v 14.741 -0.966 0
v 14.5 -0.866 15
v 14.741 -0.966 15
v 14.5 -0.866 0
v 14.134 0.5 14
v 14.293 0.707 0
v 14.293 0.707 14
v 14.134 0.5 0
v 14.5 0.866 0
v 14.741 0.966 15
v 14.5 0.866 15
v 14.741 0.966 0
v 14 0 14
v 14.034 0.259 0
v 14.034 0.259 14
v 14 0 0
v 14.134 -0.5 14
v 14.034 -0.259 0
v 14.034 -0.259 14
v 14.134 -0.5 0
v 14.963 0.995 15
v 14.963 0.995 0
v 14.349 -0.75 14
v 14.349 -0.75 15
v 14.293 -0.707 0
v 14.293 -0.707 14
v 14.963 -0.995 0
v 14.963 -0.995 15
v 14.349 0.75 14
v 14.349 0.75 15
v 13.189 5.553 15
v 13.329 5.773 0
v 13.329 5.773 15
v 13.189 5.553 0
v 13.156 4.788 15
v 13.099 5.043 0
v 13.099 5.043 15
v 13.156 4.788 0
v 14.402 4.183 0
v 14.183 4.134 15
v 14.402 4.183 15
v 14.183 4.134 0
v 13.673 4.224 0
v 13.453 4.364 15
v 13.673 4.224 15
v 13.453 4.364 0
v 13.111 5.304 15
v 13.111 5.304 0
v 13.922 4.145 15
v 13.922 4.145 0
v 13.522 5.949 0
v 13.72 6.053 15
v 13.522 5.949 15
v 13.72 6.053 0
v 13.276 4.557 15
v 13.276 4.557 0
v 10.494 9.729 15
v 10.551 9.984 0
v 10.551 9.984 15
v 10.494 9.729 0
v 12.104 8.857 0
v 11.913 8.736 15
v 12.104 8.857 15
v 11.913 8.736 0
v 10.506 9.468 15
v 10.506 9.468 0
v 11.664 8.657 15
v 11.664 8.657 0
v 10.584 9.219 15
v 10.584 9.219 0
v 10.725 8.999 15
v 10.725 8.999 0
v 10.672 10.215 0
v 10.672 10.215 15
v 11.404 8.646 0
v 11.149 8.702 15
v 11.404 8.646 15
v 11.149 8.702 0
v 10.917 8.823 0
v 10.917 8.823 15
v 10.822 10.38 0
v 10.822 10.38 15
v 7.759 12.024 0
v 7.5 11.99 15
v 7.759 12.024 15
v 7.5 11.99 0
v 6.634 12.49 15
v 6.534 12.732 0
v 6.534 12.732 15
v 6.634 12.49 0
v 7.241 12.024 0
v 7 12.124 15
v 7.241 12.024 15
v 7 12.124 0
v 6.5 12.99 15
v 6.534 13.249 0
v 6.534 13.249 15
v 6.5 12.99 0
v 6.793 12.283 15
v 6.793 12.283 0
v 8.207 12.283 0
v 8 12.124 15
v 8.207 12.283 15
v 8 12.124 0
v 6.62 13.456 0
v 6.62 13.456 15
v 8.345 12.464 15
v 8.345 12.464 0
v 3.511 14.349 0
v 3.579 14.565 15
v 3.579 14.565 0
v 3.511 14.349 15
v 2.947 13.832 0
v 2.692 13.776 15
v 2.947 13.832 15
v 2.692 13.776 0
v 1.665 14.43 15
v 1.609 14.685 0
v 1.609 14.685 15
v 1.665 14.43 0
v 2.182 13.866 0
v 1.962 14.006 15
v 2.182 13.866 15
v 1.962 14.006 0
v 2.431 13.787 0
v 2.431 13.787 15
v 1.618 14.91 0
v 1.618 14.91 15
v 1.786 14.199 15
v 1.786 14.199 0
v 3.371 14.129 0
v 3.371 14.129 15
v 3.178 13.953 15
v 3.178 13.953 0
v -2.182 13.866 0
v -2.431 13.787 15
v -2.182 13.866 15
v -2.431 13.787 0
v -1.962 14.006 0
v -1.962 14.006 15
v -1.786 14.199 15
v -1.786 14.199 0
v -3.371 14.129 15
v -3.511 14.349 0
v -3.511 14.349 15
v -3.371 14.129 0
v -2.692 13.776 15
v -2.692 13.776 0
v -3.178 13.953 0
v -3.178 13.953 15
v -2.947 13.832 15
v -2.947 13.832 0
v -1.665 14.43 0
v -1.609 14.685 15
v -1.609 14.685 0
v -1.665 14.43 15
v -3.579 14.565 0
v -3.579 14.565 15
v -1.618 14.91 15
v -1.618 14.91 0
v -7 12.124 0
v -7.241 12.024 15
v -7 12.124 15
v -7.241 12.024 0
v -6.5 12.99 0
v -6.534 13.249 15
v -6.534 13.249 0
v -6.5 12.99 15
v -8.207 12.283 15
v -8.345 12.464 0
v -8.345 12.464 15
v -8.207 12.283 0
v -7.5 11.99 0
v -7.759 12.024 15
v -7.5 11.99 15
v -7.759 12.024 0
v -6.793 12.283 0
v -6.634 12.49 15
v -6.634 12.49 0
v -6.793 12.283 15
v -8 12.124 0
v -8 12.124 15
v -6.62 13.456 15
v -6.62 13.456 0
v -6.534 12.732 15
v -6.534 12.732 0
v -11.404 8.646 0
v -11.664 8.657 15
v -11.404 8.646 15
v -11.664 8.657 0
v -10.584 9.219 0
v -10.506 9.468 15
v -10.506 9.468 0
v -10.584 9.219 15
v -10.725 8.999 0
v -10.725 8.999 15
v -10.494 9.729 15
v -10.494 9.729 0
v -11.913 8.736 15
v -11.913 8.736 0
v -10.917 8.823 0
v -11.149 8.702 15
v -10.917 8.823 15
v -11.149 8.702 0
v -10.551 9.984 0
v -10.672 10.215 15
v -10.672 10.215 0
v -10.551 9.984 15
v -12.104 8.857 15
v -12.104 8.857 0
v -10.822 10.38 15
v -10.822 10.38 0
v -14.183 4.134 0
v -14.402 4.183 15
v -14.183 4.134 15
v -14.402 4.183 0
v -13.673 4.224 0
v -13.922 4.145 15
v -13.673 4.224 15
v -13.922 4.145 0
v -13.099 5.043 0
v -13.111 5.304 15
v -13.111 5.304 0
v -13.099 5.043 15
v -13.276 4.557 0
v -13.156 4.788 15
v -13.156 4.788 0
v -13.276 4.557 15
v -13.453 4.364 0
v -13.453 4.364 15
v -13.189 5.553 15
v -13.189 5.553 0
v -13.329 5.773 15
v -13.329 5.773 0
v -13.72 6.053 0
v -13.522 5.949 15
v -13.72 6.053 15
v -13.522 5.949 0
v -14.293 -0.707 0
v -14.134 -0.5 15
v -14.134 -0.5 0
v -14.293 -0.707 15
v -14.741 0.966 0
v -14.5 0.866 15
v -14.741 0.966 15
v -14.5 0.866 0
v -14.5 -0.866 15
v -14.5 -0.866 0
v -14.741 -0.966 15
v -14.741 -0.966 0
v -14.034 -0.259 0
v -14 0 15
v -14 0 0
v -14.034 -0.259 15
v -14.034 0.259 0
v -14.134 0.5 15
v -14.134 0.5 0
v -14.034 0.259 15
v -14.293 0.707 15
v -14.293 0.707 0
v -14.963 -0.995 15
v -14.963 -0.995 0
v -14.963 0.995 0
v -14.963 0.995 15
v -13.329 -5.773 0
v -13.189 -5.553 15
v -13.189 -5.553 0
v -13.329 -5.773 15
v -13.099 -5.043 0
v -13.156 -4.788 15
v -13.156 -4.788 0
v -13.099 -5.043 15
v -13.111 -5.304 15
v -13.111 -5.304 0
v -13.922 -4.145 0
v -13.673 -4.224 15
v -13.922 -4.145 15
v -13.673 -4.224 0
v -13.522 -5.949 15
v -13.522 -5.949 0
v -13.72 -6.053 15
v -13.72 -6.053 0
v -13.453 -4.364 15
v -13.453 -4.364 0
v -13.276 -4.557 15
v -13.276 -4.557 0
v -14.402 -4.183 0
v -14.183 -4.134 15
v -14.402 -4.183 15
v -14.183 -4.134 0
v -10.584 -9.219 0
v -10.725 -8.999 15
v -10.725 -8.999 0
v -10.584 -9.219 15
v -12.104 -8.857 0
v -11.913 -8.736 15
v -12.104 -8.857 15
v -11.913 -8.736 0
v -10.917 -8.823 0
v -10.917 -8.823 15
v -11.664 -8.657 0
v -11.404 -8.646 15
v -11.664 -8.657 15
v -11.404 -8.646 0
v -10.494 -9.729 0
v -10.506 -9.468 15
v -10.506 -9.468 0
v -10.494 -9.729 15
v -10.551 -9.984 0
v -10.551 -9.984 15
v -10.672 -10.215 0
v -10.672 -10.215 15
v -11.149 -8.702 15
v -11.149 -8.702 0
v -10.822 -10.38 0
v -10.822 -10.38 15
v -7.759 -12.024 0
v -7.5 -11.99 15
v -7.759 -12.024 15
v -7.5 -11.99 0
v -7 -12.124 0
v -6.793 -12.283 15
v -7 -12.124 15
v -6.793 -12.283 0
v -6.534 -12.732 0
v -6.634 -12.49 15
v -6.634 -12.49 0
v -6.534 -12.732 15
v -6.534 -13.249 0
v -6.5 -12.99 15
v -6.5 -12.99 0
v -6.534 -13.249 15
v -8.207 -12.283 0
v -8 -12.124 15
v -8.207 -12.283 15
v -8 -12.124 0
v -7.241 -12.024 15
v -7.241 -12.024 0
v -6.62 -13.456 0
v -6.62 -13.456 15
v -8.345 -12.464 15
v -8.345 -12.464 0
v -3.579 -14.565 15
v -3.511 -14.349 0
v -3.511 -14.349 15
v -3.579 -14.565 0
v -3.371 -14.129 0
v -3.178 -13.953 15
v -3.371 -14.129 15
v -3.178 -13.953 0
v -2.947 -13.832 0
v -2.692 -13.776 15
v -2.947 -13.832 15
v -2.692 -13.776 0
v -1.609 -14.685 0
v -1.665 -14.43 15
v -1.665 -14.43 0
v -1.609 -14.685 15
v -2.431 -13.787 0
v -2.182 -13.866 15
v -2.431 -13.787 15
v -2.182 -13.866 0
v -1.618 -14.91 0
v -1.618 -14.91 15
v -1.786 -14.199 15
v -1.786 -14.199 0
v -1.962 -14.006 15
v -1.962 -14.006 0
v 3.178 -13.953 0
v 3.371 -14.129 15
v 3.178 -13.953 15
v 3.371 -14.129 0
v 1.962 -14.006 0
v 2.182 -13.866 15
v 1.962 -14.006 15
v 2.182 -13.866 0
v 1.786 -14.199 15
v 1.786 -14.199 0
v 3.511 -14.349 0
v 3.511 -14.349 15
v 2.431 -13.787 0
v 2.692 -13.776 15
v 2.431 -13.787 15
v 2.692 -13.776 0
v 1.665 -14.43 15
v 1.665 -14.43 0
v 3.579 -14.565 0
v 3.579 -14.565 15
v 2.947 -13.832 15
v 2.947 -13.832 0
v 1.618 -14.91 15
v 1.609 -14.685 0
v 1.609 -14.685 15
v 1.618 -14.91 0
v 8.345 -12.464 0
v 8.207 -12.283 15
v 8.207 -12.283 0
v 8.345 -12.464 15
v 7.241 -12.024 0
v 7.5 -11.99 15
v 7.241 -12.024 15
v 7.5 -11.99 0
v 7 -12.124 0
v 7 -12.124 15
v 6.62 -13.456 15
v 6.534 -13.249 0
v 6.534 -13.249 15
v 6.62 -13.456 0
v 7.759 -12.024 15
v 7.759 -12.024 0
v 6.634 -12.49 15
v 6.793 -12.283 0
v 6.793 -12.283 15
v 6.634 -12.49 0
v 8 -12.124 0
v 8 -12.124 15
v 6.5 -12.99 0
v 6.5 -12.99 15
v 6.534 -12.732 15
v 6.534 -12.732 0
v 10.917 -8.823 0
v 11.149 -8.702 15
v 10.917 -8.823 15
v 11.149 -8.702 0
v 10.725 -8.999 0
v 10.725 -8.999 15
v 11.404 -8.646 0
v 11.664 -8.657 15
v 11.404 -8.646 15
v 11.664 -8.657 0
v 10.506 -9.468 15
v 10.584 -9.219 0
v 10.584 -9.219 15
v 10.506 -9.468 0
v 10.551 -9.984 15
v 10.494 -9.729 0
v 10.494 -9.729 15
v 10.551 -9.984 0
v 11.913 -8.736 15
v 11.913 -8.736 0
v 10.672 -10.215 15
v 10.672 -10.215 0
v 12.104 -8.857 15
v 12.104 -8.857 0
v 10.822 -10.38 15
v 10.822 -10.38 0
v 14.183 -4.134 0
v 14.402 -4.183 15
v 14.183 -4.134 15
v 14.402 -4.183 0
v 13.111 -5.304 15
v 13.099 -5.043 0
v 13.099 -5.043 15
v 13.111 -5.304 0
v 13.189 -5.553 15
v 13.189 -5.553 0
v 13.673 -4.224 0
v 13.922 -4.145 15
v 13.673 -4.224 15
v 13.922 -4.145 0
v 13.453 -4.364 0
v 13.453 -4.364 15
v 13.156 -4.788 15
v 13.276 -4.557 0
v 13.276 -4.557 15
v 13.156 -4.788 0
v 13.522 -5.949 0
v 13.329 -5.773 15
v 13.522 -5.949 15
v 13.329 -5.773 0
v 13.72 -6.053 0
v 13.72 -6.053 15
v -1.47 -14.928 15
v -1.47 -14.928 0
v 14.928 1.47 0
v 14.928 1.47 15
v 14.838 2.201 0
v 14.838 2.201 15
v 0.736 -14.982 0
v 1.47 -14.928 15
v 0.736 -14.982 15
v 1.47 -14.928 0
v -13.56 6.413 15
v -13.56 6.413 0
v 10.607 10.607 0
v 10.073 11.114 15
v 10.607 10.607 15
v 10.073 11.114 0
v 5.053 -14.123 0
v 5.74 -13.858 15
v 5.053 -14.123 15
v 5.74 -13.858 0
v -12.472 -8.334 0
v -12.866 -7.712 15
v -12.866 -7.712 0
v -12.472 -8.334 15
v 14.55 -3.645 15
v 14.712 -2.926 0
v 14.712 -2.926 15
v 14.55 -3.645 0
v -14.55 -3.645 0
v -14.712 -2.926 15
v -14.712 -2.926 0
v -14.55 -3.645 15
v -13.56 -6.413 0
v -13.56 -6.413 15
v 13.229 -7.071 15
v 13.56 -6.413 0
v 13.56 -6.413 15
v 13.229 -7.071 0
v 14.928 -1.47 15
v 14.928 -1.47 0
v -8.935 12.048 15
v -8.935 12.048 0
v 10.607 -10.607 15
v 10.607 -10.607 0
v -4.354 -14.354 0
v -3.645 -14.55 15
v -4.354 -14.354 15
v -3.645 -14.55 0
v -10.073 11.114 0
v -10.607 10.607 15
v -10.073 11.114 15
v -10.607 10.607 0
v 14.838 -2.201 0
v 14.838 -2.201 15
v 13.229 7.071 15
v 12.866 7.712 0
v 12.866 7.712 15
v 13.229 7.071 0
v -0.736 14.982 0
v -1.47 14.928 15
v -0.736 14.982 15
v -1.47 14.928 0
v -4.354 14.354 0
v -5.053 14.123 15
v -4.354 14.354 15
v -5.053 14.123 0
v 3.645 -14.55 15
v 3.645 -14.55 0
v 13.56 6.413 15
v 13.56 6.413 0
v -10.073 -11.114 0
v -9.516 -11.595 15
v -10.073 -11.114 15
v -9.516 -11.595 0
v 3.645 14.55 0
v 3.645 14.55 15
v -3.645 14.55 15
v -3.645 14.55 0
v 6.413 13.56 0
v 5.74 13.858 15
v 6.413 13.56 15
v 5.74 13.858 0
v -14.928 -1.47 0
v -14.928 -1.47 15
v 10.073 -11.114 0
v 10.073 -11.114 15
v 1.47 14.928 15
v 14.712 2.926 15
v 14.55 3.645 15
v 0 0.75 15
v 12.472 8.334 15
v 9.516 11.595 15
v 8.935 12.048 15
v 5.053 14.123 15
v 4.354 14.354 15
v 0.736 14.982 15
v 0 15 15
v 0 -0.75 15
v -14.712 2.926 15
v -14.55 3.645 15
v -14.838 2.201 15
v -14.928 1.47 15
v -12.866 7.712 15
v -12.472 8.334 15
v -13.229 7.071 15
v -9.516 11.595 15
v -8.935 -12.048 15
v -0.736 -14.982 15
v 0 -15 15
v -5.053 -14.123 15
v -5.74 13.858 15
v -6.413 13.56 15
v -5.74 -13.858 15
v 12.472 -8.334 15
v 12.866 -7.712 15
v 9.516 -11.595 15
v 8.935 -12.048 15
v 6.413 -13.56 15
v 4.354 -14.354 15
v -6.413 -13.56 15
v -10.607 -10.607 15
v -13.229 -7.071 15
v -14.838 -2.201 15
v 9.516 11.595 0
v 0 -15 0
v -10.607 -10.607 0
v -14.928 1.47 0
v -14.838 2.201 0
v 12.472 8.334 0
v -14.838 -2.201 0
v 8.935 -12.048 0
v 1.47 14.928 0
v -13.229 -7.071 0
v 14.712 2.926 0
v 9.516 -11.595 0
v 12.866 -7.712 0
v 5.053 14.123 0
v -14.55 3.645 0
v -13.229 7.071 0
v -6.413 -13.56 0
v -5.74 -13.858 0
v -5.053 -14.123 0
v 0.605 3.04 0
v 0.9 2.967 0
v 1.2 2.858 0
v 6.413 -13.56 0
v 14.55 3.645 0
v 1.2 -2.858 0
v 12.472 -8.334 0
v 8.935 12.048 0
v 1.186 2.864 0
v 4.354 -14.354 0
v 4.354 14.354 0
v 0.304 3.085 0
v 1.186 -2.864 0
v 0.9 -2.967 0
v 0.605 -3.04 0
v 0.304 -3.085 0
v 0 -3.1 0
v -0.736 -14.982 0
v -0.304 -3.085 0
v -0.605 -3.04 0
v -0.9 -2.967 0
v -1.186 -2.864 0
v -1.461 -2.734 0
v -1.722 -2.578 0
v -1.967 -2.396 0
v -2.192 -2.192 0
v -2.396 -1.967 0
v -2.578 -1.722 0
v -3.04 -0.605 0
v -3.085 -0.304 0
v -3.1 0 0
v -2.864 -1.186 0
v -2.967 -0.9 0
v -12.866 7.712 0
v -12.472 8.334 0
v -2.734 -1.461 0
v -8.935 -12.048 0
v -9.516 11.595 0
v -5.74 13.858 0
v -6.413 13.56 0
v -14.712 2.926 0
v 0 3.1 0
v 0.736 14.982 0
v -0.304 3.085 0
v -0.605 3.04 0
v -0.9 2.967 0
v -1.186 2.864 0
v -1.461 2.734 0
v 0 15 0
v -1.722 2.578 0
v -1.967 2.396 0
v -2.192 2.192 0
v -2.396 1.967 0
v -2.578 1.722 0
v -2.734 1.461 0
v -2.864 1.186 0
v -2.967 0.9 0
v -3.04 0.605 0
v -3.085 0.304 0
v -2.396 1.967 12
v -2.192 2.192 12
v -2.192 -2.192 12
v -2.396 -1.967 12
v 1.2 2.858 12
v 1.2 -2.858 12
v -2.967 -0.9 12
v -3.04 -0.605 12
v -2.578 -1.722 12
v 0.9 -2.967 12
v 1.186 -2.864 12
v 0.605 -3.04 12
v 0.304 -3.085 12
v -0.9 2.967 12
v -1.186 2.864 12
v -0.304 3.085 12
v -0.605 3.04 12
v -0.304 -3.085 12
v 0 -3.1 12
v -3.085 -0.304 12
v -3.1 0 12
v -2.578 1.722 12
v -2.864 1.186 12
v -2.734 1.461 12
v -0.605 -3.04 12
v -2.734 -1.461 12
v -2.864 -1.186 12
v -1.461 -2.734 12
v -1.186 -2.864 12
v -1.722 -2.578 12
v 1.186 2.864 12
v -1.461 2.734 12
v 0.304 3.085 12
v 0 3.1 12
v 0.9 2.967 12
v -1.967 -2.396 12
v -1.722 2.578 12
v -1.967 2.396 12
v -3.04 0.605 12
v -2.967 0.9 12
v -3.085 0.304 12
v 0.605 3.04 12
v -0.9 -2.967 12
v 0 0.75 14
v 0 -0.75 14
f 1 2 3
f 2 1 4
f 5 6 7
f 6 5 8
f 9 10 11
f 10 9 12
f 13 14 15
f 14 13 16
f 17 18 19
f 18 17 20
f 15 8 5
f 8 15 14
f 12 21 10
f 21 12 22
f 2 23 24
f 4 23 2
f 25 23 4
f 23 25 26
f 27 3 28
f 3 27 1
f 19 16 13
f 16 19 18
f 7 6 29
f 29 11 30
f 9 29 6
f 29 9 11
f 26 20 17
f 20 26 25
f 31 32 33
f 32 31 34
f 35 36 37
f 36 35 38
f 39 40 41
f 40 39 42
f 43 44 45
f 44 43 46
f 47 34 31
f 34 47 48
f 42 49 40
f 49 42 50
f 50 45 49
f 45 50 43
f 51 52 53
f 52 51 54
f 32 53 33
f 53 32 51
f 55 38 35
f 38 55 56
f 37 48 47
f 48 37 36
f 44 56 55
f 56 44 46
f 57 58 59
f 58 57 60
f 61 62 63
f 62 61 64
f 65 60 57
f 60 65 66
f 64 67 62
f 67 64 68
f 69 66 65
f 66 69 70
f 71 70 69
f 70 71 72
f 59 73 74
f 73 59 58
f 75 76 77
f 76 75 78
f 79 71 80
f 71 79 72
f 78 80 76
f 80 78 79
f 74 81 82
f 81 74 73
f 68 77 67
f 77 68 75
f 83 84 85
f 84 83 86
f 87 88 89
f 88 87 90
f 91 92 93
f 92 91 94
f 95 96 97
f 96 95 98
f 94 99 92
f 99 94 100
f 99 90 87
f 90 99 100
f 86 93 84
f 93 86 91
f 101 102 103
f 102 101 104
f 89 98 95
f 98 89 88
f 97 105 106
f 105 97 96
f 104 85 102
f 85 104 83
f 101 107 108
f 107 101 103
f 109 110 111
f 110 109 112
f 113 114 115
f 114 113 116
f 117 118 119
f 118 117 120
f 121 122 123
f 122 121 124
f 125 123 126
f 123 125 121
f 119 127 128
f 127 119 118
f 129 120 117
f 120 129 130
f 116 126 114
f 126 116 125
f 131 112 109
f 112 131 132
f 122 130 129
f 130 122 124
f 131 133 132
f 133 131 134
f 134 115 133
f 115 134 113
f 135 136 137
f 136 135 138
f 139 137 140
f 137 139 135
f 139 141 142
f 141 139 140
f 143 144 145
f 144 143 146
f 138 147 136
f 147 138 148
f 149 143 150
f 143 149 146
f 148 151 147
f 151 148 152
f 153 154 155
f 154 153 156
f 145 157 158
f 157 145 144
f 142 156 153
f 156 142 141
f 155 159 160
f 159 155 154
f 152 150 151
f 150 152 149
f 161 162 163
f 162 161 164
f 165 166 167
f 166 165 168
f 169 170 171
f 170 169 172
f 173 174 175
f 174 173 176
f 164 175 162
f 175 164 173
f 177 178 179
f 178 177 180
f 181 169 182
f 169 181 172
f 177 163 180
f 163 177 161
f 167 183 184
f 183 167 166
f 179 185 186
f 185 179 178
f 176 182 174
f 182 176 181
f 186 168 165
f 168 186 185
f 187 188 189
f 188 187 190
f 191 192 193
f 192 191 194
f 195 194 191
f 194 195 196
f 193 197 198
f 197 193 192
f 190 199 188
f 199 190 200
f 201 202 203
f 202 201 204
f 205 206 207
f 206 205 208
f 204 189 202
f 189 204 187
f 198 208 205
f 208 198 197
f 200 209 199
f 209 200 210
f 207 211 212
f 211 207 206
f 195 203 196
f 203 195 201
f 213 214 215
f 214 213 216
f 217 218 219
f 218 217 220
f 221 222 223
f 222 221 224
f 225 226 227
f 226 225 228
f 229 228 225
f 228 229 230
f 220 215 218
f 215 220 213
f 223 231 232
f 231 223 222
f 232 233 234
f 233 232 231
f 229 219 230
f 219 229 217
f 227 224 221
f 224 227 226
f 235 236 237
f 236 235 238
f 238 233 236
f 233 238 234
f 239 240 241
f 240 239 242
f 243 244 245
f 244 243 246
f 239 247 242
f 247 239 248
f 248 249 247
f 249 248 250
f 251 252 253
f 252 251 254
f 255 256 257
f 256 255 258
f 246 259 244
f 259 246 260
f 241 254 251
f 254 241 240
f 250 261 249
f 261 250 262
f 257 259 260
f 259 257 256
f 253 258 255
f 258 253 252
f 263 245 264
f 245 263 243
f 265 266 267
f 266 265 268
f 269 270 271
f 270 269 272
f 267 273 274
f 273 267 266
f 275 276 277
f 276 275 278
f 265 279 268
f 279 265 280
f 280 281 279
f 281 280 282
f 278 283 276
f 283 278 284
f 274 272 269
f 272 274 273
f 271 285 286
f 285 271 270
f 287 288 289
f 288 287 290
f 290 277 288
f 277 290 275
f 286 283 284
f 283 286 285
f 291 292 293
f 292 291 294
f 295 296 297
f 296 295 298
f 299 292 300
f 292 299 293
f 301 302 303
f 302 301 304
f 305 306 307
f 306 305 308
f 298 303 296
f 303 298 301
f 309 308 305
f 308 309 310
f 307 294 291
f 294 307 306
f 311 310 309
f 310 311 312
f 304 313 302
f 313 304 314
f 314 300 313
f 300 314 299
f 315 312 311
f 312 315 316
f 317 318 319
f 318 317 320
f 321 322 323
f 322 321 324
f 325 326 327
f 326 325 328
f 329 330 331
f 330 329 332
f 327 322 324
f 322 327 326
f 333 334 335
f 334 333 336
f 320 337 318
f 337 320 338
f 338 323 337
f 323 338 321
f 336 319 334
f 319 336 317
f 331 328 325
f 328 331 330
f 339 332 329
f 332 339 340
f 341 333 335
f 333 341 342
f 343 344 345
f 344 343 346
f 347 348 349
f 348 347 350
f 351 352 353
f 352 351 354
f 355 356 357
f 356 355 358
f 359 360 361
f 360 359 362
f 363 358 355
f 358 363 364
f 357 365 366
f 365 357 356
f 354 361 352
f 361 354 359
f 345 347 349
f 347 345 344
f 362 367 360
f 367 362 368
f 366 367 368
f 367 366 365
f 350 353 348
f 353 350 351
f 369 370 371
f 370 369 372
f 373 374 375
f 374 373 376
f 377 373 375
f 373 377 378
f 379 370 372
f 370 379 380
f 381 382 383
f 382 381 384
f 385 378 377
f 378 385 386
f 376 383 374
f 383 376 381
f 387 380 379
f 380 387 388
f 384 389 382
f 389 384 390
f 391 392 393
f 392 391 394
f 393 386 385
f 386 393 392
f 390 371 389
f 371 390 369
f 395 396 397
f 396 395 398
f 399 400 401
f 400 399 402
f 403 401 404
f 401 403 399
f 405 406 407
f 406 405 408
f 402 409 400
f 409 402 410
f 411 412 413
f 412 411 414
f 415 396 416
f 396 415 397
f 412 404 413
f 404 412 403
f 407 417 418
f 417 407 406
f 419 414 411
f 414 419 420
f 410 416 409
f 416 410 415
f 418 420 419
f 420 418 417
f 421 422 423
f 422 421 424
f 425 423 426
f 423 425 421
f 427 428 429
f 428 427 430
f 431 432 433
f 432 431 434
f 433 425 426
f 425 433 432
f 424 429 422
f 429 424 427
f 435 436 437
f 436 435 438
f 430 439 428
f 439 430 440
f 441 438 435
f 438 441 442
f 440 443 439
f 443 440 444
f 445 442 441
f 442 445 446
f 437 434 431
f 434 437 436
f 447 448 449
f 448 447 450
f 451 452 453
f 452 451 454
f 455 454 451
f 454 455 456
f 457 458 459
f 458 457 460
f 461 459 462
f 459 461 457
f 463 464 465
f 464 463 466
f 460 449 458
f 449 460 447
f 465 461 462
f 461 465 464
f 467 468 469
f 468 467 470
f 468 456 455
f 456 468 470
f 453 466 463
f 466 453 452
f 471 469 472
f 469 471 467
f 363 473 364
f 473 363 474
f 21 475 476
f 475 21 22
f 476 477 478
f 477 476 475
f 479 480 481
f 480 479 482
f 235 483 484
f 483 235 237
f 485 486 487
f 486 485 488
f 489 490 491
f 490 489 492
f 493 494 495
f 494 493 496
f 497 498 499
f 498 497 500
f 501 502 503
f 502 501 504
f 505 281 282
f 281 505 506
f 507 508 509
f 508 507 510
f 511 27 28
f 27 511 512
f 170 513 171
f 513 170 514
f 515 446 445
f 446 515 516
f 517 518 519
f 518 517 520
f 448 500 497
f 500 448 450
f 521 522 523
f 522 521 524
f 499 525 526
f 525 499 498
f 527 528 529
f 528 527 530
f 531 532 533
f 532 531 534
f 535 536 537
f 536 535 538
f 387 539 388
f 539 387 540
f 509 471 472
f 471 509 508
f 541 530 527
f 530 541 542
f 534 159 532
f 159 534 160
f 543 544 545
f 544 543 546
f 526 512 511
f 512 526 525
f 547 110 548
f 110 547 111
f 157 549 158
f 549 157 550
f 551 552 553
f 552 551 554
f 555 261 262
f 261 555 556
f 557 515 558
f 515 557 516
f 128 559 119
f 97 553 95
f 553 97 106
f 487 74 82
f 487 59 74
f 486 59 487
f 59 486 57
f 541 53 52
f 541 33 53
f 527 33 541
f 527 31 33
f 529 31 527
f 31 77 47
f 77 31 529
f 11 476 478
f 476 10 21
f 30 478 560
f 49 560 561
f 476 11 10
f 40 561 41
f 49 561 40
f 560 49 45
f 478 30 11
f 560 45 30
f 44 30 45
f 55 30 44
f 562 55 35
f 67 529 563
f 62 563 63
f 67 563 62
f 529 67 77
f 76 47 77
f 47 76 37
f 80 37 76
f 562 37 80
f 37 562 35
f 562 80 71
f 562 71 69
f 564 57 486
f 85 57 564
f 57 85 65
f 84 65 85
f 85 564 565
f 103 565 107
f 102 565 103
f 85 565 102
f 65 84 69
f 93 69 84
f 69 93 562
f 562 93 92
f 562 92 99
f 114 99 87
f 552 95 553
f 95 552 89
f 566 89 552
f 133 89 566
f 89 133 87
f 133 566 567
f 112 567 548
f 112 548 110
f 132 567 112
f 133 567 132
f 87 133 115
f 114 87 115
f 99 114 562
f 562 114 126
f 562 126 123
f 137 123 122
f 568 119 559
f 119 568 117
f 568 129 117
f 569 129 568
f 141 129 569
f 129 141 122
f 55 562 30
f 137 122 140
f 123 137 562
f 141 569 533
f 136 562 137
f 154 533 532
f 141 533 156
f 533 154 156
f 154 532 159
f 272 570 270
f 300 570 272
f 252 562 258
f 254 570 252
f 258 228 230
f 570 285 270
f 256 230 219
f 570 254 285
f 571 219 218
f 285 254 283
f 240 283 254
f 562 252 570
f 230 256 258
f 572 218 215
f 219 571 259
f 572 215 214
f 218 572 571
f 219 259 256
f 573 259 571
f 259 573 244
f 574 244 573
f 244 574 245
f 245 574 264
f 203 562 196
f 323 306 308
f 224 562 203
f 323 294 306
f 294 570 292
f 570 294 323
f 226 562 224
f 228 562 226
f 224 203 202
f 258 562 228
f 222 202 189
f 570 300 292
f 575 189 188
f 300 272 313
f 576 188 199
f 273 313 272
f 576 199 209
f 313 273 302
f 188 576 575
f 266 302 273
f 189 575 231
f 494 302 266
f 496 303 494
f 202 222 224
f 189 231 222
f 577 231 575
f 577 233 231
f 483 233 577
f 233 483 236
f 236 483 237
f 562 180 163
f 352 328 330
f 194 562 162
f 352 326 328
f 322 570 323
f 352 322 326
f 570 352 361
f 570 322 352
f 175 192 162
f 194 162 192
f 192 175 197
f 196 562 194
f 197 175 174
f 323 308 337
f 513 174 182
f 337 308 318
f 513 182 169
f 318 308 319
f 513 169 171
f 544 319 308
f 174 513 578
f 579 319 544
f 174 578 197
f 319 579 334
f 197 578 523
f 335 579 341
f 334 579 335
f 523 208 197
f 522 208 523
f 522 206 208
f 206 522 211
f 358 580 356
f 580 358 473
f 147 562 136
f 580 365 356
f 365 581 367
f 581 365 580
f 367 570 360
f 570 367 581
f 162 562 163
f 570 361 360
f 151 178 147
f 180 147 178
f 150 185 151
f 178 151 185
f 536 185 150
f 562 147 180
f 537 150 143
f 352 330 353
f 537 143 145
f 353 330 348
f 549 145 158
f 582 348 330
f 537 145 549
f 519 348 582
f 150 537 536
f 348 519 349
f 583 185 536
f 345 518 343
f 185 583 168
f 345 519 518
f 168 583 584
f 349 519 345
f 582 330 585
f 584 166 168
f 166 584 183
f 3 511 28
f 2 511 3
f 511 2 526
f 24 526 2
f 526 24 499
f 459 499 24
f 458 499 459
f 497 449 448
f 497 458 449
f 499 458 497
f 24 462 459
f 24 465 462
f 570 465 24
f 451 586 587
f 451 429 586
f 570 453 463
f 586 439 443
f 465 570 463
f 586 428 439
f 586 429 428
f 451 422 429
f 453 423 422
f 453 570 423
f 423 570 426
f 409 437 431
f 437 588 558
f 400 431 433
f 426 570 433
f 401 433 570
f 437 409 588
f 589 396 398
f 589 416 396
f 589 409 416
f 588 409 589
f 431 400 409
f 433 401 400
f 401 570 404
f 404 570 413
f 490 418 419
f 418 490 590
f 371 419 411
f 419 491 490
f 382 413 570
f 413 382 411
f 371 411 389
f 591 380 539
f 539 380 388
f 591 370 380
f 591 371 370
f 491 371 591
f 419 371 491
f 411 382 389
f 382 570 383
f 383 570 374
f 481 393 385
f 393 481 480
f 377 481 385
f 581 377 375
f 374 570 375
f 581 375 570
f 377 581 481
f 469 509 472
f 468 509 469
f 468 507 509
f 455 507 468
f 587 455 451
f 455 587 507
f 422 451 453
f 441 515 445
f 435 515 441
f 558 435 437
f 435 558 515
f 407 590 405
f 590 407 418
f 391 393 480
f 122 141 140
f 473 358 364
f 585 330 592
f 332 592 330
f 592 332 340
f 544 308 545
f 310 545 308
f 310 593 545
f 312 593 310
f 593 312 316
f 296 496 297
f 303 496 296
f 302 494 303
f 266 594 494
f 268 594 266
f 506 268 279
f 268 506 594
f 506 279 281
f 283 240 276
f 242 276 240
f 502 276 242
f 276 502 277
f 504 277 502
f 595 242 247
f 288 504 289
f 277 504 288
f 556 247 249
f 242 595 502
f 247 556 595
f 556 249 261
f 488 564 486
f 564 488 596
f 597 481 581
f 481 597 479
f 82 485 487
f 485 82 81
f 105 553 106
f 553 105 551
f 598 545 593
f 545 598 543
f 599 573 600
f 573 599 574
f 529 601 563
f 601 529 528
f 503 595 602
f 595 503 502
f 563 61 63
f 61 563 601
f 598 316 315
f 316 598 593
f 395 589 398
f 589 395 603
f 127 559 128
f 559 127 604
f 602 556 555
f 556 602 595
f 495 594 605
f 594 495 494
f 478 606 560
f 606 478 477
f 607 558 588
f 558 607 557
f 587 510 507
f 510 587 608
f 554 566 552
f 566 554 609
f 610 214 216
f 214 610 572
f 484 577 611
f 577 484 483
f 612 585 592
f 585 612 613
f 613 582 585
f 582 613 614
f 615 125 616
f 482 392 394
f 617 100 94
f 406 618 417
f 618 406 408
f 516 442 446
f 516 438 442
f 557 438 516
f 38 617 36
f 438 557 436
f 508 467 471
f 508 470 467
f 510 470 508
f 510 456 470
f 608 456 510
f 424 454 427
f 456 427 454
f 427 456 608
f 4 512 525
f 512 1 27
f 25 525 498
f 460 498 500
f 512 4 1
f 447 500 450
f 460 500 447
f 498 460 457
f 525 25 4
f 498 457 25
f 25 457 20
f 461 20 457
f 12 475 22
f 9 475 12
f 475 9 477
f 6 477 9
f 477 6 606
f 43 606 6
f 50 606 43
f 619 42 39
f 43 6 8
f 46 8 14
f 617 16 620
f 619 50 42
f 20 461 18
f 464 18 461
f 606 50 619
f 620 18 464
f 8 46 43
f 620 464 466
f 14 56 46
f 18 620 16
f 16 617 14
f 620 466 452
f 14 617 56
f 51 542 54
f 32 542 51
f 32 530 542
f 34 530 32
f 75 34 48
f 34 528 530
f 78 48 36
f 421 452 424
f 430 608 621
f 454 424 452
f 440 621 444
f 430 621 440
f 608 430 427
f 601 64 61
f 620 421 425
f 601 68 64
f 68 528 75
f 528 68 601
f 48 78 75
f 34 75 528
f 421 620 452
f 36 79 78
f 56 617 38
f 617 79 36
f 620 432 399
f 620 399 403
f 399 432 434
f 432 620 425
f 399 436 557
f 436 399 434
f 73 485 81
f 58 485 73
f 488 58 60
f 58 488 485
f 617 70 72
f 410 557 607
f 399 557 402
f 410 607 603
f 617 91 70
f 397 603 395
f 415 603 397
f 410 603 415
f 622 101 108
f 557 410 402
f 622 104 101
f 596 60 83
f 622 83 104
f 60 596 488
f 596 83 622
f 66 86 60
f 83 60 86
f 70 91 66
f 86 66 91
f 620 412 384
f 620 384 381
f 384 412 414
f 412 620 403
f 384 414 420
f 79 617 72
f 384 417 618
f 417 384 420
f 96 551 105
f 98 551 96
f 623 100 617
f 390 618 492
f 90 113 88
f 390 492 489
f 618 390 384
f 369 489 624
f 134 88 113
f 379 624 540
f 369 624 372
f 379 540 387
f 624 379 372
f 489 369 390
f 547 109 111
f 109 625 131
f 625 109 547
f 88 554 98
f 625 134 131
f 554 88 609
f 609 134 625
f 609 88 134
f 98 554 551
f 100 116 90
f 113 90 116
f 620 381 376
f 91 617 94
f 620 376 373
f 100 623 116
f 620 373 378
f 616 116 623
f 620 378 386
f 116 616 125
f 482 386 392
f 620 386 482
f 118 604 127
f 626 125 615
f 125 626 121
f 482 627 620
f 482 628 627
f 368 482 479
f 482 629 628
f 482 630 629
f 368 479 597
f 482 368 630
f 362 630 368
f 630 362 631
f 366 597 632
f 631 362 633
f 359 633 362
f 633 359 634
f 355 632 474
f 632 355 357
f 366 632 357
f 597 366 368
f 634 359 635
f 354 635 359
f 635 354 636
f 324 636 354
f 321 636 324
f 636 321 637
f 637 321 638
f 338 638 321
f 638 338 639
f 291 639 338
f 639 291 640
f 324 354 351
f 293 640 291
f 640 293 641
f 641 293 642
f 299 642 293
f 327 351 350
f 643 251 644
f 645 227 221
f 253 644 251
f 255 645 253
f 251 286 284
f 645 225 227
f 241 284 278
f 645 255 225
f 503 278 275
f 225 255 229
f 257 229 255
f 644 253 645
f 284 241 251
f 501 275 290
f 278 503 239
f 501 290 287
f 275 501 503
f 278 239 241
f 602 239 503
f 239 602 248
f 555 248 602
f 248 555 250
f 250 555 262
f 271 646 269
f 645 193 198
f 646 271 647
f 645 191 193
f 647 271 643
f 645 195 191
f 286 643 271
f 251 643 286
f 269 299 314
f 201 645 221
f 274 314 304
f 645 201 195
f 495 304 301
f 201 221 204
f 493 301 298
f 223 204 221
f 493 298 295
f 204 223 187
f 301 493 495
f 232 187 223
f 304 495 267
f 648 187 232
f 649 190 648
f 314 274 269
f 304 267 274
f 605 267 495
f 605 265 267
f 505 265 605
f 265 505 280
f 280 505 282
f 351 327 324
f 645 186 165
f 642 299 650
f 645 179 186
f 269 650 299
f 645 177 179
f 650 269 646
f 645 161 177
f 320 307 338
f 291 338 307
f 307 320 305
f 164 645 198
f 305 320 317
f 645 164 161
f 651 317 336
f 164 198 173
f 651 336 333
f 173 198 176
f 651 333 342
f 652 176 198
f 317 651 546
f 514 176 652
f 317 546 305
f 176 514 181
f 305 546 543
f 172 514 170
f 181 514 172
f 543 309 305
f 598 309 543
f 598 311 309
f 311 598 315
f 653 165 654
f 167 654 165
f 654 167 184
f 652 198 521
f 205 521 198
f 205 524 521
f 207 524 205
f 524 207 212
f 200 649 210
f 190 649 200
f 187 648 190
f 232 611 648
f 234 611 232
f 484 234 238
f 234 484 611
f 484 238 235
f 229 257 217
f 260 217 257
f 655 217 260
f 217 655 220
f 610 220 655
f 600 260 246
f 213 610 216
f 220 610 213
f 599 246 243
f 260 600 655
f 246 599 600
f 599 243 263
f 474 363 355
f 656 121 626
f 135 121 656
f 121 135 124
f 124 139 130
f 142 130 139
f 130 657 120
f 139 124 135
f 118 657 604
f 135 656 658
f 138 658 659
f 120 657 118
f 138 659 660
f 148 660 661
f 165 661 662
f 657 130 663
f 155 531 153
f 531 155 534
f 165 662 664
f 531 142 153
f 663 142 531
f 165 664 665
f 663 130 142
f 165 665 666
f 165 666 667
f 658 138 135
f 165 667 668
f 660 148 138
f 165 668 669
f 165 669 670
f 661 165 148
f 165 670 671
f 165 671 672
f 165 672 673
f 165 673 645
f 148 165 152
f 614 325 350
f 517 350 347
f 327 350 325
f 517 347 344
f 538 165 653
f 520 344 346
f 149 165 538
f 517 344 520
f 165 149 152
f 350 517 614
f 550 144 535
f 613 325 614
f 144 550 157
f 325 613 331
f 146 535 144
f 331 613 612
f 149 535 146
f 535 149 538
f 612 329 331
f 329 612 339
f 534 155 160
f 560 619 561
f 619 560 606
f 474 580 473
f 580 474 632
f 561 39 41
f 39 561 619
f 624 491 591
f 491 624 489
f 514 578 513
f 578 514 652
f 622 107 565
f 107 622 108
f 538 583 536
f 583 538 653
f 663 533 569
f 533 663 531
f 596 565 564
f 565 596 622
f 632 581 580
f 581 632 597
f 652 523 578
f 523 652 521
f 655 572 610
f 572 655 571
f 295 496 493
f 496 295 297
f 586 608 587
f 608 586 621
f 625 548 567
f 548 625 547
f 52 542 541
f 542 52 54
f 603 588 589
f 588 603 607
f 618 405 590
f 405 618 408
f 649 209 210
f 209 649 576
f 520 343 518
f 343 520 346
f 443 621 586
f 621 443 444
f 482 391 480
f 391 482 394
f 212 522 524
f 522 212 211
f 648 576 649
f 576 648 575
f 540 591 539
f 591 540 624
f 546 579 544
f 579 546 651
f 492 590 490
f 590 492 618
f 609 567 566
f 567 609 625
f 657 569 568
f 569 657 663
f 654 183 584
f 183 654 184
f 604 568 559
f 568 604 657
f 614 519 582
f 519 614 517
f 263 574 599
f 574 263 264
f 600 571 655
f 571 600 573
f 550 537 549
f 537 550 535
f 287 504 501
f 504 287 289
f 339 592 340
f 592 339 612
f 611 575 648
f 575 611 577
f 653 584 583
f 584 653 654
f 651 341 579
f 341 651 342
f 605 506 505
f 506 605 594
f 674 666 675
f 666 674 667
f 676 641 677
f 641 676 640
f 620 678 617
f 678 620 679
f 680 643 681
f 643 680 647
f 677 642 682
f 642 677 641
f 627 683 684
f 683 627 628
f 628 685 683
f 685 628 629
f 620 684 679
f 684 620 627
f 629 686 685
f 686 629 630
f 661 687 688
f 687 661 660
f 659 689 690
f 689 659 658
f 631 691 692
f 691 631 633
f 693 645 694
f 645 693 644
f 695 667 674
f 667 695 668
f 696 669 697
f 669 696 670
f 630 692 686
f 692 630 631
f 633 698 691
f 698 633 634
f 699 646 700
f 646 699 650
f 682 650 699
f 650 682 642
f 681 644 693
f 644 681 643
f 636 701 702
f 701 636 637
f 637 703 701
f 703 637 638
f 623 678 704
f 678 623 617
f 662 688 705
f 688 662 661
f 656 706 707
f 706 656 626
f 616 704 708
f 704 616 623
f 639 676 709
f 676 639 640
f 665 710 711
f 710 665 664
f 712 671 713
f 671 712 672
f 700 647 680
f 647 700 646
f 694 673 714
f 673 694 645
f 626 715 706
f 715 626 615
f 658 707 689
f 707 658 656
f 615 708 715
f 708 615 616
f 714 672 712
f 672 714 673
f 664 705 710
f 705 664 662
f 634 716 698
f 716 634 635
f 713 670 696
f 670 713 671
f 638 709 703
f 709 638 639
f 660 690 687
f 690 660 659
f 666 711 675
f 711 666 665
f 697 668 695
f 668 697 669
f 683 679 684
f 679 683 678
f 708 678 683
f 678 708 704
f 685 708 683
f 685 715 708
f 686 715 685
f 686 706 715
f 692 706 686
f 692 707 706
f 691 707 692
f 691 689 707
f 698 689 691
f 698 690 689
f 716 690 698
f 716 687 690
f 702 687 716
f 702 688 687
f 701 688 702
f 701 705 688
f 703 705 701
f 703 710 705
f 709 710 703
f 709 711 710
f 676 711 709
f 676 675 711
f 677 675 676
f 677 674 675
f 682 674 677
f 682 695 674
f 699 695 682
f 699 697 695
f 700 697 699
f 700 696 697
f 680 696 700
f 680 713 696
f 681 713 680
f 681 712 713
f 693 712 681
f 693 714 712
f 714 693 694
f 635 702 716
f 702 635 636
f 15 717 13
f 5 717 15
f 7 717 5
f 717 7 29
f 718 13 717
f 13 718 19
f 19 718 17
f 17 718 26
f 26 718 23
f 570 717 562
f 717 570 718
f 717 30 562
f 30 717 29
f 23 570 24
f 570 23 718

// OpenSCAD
// Replacement knob for a 6 mm D-shaft (hotplates, stirrers, power supplies)
// Category: quick fixes. D-shaped blind bore from the bottom, grip grooves and a
// pointer groove on top that lines up with the flat of the shaft.
// Print: PETG (heat near hotplates), 0.15 mm layers, 4 perimeters, bore face down.
// SPDX-License-Identifier: CERN-OHL-P-2.0

/* [Knob] */
knob_d = 30;
knob_h = 15;
shaft_d = 6.2;         // 6 mm shaft + 0.2 mm clearance
shaft_flat = 4.3;      // flat-to-round distance (4.5 mm nominal + clearance)
bore_depth = 12;
n_grooves = 18;
groove_d = 2;
pointer_w = 1.5;
pointer_depth = 1;

/* [Hidden] */
eps = 0.01;

difference() {
    cylinder(d = knob_d, h = knob_h, $fn = 128);
    // D-shaped bore; the flat faces +X
    translate([0, 0, -eps])
        linear_extrude(bore_depth + eps)
            intersection() {
                circle(d = shaft_d, $fn = 64);
                translate([-shaft_d / 2, -shaft_d / 2]) square([shaft_flat, shaft_d]);
            }
    // grip grooves
    for (i = [0 : n_grooves - 1])
        rotate(i * 360 / n_grooves)
            translate([knob_d / 2, 0, -eps]) cylinder(d = groove_d, h = knob_h + 2 * eps, $fn = 24);
    // pointer groove on top, pointing at the flat (+X)
    translate([0, -pointer_w / 2, knob_h - pointer_depth])
        cube([knob_d / 2 + 1, pointer_w, pointer_depth + eps]);
}
